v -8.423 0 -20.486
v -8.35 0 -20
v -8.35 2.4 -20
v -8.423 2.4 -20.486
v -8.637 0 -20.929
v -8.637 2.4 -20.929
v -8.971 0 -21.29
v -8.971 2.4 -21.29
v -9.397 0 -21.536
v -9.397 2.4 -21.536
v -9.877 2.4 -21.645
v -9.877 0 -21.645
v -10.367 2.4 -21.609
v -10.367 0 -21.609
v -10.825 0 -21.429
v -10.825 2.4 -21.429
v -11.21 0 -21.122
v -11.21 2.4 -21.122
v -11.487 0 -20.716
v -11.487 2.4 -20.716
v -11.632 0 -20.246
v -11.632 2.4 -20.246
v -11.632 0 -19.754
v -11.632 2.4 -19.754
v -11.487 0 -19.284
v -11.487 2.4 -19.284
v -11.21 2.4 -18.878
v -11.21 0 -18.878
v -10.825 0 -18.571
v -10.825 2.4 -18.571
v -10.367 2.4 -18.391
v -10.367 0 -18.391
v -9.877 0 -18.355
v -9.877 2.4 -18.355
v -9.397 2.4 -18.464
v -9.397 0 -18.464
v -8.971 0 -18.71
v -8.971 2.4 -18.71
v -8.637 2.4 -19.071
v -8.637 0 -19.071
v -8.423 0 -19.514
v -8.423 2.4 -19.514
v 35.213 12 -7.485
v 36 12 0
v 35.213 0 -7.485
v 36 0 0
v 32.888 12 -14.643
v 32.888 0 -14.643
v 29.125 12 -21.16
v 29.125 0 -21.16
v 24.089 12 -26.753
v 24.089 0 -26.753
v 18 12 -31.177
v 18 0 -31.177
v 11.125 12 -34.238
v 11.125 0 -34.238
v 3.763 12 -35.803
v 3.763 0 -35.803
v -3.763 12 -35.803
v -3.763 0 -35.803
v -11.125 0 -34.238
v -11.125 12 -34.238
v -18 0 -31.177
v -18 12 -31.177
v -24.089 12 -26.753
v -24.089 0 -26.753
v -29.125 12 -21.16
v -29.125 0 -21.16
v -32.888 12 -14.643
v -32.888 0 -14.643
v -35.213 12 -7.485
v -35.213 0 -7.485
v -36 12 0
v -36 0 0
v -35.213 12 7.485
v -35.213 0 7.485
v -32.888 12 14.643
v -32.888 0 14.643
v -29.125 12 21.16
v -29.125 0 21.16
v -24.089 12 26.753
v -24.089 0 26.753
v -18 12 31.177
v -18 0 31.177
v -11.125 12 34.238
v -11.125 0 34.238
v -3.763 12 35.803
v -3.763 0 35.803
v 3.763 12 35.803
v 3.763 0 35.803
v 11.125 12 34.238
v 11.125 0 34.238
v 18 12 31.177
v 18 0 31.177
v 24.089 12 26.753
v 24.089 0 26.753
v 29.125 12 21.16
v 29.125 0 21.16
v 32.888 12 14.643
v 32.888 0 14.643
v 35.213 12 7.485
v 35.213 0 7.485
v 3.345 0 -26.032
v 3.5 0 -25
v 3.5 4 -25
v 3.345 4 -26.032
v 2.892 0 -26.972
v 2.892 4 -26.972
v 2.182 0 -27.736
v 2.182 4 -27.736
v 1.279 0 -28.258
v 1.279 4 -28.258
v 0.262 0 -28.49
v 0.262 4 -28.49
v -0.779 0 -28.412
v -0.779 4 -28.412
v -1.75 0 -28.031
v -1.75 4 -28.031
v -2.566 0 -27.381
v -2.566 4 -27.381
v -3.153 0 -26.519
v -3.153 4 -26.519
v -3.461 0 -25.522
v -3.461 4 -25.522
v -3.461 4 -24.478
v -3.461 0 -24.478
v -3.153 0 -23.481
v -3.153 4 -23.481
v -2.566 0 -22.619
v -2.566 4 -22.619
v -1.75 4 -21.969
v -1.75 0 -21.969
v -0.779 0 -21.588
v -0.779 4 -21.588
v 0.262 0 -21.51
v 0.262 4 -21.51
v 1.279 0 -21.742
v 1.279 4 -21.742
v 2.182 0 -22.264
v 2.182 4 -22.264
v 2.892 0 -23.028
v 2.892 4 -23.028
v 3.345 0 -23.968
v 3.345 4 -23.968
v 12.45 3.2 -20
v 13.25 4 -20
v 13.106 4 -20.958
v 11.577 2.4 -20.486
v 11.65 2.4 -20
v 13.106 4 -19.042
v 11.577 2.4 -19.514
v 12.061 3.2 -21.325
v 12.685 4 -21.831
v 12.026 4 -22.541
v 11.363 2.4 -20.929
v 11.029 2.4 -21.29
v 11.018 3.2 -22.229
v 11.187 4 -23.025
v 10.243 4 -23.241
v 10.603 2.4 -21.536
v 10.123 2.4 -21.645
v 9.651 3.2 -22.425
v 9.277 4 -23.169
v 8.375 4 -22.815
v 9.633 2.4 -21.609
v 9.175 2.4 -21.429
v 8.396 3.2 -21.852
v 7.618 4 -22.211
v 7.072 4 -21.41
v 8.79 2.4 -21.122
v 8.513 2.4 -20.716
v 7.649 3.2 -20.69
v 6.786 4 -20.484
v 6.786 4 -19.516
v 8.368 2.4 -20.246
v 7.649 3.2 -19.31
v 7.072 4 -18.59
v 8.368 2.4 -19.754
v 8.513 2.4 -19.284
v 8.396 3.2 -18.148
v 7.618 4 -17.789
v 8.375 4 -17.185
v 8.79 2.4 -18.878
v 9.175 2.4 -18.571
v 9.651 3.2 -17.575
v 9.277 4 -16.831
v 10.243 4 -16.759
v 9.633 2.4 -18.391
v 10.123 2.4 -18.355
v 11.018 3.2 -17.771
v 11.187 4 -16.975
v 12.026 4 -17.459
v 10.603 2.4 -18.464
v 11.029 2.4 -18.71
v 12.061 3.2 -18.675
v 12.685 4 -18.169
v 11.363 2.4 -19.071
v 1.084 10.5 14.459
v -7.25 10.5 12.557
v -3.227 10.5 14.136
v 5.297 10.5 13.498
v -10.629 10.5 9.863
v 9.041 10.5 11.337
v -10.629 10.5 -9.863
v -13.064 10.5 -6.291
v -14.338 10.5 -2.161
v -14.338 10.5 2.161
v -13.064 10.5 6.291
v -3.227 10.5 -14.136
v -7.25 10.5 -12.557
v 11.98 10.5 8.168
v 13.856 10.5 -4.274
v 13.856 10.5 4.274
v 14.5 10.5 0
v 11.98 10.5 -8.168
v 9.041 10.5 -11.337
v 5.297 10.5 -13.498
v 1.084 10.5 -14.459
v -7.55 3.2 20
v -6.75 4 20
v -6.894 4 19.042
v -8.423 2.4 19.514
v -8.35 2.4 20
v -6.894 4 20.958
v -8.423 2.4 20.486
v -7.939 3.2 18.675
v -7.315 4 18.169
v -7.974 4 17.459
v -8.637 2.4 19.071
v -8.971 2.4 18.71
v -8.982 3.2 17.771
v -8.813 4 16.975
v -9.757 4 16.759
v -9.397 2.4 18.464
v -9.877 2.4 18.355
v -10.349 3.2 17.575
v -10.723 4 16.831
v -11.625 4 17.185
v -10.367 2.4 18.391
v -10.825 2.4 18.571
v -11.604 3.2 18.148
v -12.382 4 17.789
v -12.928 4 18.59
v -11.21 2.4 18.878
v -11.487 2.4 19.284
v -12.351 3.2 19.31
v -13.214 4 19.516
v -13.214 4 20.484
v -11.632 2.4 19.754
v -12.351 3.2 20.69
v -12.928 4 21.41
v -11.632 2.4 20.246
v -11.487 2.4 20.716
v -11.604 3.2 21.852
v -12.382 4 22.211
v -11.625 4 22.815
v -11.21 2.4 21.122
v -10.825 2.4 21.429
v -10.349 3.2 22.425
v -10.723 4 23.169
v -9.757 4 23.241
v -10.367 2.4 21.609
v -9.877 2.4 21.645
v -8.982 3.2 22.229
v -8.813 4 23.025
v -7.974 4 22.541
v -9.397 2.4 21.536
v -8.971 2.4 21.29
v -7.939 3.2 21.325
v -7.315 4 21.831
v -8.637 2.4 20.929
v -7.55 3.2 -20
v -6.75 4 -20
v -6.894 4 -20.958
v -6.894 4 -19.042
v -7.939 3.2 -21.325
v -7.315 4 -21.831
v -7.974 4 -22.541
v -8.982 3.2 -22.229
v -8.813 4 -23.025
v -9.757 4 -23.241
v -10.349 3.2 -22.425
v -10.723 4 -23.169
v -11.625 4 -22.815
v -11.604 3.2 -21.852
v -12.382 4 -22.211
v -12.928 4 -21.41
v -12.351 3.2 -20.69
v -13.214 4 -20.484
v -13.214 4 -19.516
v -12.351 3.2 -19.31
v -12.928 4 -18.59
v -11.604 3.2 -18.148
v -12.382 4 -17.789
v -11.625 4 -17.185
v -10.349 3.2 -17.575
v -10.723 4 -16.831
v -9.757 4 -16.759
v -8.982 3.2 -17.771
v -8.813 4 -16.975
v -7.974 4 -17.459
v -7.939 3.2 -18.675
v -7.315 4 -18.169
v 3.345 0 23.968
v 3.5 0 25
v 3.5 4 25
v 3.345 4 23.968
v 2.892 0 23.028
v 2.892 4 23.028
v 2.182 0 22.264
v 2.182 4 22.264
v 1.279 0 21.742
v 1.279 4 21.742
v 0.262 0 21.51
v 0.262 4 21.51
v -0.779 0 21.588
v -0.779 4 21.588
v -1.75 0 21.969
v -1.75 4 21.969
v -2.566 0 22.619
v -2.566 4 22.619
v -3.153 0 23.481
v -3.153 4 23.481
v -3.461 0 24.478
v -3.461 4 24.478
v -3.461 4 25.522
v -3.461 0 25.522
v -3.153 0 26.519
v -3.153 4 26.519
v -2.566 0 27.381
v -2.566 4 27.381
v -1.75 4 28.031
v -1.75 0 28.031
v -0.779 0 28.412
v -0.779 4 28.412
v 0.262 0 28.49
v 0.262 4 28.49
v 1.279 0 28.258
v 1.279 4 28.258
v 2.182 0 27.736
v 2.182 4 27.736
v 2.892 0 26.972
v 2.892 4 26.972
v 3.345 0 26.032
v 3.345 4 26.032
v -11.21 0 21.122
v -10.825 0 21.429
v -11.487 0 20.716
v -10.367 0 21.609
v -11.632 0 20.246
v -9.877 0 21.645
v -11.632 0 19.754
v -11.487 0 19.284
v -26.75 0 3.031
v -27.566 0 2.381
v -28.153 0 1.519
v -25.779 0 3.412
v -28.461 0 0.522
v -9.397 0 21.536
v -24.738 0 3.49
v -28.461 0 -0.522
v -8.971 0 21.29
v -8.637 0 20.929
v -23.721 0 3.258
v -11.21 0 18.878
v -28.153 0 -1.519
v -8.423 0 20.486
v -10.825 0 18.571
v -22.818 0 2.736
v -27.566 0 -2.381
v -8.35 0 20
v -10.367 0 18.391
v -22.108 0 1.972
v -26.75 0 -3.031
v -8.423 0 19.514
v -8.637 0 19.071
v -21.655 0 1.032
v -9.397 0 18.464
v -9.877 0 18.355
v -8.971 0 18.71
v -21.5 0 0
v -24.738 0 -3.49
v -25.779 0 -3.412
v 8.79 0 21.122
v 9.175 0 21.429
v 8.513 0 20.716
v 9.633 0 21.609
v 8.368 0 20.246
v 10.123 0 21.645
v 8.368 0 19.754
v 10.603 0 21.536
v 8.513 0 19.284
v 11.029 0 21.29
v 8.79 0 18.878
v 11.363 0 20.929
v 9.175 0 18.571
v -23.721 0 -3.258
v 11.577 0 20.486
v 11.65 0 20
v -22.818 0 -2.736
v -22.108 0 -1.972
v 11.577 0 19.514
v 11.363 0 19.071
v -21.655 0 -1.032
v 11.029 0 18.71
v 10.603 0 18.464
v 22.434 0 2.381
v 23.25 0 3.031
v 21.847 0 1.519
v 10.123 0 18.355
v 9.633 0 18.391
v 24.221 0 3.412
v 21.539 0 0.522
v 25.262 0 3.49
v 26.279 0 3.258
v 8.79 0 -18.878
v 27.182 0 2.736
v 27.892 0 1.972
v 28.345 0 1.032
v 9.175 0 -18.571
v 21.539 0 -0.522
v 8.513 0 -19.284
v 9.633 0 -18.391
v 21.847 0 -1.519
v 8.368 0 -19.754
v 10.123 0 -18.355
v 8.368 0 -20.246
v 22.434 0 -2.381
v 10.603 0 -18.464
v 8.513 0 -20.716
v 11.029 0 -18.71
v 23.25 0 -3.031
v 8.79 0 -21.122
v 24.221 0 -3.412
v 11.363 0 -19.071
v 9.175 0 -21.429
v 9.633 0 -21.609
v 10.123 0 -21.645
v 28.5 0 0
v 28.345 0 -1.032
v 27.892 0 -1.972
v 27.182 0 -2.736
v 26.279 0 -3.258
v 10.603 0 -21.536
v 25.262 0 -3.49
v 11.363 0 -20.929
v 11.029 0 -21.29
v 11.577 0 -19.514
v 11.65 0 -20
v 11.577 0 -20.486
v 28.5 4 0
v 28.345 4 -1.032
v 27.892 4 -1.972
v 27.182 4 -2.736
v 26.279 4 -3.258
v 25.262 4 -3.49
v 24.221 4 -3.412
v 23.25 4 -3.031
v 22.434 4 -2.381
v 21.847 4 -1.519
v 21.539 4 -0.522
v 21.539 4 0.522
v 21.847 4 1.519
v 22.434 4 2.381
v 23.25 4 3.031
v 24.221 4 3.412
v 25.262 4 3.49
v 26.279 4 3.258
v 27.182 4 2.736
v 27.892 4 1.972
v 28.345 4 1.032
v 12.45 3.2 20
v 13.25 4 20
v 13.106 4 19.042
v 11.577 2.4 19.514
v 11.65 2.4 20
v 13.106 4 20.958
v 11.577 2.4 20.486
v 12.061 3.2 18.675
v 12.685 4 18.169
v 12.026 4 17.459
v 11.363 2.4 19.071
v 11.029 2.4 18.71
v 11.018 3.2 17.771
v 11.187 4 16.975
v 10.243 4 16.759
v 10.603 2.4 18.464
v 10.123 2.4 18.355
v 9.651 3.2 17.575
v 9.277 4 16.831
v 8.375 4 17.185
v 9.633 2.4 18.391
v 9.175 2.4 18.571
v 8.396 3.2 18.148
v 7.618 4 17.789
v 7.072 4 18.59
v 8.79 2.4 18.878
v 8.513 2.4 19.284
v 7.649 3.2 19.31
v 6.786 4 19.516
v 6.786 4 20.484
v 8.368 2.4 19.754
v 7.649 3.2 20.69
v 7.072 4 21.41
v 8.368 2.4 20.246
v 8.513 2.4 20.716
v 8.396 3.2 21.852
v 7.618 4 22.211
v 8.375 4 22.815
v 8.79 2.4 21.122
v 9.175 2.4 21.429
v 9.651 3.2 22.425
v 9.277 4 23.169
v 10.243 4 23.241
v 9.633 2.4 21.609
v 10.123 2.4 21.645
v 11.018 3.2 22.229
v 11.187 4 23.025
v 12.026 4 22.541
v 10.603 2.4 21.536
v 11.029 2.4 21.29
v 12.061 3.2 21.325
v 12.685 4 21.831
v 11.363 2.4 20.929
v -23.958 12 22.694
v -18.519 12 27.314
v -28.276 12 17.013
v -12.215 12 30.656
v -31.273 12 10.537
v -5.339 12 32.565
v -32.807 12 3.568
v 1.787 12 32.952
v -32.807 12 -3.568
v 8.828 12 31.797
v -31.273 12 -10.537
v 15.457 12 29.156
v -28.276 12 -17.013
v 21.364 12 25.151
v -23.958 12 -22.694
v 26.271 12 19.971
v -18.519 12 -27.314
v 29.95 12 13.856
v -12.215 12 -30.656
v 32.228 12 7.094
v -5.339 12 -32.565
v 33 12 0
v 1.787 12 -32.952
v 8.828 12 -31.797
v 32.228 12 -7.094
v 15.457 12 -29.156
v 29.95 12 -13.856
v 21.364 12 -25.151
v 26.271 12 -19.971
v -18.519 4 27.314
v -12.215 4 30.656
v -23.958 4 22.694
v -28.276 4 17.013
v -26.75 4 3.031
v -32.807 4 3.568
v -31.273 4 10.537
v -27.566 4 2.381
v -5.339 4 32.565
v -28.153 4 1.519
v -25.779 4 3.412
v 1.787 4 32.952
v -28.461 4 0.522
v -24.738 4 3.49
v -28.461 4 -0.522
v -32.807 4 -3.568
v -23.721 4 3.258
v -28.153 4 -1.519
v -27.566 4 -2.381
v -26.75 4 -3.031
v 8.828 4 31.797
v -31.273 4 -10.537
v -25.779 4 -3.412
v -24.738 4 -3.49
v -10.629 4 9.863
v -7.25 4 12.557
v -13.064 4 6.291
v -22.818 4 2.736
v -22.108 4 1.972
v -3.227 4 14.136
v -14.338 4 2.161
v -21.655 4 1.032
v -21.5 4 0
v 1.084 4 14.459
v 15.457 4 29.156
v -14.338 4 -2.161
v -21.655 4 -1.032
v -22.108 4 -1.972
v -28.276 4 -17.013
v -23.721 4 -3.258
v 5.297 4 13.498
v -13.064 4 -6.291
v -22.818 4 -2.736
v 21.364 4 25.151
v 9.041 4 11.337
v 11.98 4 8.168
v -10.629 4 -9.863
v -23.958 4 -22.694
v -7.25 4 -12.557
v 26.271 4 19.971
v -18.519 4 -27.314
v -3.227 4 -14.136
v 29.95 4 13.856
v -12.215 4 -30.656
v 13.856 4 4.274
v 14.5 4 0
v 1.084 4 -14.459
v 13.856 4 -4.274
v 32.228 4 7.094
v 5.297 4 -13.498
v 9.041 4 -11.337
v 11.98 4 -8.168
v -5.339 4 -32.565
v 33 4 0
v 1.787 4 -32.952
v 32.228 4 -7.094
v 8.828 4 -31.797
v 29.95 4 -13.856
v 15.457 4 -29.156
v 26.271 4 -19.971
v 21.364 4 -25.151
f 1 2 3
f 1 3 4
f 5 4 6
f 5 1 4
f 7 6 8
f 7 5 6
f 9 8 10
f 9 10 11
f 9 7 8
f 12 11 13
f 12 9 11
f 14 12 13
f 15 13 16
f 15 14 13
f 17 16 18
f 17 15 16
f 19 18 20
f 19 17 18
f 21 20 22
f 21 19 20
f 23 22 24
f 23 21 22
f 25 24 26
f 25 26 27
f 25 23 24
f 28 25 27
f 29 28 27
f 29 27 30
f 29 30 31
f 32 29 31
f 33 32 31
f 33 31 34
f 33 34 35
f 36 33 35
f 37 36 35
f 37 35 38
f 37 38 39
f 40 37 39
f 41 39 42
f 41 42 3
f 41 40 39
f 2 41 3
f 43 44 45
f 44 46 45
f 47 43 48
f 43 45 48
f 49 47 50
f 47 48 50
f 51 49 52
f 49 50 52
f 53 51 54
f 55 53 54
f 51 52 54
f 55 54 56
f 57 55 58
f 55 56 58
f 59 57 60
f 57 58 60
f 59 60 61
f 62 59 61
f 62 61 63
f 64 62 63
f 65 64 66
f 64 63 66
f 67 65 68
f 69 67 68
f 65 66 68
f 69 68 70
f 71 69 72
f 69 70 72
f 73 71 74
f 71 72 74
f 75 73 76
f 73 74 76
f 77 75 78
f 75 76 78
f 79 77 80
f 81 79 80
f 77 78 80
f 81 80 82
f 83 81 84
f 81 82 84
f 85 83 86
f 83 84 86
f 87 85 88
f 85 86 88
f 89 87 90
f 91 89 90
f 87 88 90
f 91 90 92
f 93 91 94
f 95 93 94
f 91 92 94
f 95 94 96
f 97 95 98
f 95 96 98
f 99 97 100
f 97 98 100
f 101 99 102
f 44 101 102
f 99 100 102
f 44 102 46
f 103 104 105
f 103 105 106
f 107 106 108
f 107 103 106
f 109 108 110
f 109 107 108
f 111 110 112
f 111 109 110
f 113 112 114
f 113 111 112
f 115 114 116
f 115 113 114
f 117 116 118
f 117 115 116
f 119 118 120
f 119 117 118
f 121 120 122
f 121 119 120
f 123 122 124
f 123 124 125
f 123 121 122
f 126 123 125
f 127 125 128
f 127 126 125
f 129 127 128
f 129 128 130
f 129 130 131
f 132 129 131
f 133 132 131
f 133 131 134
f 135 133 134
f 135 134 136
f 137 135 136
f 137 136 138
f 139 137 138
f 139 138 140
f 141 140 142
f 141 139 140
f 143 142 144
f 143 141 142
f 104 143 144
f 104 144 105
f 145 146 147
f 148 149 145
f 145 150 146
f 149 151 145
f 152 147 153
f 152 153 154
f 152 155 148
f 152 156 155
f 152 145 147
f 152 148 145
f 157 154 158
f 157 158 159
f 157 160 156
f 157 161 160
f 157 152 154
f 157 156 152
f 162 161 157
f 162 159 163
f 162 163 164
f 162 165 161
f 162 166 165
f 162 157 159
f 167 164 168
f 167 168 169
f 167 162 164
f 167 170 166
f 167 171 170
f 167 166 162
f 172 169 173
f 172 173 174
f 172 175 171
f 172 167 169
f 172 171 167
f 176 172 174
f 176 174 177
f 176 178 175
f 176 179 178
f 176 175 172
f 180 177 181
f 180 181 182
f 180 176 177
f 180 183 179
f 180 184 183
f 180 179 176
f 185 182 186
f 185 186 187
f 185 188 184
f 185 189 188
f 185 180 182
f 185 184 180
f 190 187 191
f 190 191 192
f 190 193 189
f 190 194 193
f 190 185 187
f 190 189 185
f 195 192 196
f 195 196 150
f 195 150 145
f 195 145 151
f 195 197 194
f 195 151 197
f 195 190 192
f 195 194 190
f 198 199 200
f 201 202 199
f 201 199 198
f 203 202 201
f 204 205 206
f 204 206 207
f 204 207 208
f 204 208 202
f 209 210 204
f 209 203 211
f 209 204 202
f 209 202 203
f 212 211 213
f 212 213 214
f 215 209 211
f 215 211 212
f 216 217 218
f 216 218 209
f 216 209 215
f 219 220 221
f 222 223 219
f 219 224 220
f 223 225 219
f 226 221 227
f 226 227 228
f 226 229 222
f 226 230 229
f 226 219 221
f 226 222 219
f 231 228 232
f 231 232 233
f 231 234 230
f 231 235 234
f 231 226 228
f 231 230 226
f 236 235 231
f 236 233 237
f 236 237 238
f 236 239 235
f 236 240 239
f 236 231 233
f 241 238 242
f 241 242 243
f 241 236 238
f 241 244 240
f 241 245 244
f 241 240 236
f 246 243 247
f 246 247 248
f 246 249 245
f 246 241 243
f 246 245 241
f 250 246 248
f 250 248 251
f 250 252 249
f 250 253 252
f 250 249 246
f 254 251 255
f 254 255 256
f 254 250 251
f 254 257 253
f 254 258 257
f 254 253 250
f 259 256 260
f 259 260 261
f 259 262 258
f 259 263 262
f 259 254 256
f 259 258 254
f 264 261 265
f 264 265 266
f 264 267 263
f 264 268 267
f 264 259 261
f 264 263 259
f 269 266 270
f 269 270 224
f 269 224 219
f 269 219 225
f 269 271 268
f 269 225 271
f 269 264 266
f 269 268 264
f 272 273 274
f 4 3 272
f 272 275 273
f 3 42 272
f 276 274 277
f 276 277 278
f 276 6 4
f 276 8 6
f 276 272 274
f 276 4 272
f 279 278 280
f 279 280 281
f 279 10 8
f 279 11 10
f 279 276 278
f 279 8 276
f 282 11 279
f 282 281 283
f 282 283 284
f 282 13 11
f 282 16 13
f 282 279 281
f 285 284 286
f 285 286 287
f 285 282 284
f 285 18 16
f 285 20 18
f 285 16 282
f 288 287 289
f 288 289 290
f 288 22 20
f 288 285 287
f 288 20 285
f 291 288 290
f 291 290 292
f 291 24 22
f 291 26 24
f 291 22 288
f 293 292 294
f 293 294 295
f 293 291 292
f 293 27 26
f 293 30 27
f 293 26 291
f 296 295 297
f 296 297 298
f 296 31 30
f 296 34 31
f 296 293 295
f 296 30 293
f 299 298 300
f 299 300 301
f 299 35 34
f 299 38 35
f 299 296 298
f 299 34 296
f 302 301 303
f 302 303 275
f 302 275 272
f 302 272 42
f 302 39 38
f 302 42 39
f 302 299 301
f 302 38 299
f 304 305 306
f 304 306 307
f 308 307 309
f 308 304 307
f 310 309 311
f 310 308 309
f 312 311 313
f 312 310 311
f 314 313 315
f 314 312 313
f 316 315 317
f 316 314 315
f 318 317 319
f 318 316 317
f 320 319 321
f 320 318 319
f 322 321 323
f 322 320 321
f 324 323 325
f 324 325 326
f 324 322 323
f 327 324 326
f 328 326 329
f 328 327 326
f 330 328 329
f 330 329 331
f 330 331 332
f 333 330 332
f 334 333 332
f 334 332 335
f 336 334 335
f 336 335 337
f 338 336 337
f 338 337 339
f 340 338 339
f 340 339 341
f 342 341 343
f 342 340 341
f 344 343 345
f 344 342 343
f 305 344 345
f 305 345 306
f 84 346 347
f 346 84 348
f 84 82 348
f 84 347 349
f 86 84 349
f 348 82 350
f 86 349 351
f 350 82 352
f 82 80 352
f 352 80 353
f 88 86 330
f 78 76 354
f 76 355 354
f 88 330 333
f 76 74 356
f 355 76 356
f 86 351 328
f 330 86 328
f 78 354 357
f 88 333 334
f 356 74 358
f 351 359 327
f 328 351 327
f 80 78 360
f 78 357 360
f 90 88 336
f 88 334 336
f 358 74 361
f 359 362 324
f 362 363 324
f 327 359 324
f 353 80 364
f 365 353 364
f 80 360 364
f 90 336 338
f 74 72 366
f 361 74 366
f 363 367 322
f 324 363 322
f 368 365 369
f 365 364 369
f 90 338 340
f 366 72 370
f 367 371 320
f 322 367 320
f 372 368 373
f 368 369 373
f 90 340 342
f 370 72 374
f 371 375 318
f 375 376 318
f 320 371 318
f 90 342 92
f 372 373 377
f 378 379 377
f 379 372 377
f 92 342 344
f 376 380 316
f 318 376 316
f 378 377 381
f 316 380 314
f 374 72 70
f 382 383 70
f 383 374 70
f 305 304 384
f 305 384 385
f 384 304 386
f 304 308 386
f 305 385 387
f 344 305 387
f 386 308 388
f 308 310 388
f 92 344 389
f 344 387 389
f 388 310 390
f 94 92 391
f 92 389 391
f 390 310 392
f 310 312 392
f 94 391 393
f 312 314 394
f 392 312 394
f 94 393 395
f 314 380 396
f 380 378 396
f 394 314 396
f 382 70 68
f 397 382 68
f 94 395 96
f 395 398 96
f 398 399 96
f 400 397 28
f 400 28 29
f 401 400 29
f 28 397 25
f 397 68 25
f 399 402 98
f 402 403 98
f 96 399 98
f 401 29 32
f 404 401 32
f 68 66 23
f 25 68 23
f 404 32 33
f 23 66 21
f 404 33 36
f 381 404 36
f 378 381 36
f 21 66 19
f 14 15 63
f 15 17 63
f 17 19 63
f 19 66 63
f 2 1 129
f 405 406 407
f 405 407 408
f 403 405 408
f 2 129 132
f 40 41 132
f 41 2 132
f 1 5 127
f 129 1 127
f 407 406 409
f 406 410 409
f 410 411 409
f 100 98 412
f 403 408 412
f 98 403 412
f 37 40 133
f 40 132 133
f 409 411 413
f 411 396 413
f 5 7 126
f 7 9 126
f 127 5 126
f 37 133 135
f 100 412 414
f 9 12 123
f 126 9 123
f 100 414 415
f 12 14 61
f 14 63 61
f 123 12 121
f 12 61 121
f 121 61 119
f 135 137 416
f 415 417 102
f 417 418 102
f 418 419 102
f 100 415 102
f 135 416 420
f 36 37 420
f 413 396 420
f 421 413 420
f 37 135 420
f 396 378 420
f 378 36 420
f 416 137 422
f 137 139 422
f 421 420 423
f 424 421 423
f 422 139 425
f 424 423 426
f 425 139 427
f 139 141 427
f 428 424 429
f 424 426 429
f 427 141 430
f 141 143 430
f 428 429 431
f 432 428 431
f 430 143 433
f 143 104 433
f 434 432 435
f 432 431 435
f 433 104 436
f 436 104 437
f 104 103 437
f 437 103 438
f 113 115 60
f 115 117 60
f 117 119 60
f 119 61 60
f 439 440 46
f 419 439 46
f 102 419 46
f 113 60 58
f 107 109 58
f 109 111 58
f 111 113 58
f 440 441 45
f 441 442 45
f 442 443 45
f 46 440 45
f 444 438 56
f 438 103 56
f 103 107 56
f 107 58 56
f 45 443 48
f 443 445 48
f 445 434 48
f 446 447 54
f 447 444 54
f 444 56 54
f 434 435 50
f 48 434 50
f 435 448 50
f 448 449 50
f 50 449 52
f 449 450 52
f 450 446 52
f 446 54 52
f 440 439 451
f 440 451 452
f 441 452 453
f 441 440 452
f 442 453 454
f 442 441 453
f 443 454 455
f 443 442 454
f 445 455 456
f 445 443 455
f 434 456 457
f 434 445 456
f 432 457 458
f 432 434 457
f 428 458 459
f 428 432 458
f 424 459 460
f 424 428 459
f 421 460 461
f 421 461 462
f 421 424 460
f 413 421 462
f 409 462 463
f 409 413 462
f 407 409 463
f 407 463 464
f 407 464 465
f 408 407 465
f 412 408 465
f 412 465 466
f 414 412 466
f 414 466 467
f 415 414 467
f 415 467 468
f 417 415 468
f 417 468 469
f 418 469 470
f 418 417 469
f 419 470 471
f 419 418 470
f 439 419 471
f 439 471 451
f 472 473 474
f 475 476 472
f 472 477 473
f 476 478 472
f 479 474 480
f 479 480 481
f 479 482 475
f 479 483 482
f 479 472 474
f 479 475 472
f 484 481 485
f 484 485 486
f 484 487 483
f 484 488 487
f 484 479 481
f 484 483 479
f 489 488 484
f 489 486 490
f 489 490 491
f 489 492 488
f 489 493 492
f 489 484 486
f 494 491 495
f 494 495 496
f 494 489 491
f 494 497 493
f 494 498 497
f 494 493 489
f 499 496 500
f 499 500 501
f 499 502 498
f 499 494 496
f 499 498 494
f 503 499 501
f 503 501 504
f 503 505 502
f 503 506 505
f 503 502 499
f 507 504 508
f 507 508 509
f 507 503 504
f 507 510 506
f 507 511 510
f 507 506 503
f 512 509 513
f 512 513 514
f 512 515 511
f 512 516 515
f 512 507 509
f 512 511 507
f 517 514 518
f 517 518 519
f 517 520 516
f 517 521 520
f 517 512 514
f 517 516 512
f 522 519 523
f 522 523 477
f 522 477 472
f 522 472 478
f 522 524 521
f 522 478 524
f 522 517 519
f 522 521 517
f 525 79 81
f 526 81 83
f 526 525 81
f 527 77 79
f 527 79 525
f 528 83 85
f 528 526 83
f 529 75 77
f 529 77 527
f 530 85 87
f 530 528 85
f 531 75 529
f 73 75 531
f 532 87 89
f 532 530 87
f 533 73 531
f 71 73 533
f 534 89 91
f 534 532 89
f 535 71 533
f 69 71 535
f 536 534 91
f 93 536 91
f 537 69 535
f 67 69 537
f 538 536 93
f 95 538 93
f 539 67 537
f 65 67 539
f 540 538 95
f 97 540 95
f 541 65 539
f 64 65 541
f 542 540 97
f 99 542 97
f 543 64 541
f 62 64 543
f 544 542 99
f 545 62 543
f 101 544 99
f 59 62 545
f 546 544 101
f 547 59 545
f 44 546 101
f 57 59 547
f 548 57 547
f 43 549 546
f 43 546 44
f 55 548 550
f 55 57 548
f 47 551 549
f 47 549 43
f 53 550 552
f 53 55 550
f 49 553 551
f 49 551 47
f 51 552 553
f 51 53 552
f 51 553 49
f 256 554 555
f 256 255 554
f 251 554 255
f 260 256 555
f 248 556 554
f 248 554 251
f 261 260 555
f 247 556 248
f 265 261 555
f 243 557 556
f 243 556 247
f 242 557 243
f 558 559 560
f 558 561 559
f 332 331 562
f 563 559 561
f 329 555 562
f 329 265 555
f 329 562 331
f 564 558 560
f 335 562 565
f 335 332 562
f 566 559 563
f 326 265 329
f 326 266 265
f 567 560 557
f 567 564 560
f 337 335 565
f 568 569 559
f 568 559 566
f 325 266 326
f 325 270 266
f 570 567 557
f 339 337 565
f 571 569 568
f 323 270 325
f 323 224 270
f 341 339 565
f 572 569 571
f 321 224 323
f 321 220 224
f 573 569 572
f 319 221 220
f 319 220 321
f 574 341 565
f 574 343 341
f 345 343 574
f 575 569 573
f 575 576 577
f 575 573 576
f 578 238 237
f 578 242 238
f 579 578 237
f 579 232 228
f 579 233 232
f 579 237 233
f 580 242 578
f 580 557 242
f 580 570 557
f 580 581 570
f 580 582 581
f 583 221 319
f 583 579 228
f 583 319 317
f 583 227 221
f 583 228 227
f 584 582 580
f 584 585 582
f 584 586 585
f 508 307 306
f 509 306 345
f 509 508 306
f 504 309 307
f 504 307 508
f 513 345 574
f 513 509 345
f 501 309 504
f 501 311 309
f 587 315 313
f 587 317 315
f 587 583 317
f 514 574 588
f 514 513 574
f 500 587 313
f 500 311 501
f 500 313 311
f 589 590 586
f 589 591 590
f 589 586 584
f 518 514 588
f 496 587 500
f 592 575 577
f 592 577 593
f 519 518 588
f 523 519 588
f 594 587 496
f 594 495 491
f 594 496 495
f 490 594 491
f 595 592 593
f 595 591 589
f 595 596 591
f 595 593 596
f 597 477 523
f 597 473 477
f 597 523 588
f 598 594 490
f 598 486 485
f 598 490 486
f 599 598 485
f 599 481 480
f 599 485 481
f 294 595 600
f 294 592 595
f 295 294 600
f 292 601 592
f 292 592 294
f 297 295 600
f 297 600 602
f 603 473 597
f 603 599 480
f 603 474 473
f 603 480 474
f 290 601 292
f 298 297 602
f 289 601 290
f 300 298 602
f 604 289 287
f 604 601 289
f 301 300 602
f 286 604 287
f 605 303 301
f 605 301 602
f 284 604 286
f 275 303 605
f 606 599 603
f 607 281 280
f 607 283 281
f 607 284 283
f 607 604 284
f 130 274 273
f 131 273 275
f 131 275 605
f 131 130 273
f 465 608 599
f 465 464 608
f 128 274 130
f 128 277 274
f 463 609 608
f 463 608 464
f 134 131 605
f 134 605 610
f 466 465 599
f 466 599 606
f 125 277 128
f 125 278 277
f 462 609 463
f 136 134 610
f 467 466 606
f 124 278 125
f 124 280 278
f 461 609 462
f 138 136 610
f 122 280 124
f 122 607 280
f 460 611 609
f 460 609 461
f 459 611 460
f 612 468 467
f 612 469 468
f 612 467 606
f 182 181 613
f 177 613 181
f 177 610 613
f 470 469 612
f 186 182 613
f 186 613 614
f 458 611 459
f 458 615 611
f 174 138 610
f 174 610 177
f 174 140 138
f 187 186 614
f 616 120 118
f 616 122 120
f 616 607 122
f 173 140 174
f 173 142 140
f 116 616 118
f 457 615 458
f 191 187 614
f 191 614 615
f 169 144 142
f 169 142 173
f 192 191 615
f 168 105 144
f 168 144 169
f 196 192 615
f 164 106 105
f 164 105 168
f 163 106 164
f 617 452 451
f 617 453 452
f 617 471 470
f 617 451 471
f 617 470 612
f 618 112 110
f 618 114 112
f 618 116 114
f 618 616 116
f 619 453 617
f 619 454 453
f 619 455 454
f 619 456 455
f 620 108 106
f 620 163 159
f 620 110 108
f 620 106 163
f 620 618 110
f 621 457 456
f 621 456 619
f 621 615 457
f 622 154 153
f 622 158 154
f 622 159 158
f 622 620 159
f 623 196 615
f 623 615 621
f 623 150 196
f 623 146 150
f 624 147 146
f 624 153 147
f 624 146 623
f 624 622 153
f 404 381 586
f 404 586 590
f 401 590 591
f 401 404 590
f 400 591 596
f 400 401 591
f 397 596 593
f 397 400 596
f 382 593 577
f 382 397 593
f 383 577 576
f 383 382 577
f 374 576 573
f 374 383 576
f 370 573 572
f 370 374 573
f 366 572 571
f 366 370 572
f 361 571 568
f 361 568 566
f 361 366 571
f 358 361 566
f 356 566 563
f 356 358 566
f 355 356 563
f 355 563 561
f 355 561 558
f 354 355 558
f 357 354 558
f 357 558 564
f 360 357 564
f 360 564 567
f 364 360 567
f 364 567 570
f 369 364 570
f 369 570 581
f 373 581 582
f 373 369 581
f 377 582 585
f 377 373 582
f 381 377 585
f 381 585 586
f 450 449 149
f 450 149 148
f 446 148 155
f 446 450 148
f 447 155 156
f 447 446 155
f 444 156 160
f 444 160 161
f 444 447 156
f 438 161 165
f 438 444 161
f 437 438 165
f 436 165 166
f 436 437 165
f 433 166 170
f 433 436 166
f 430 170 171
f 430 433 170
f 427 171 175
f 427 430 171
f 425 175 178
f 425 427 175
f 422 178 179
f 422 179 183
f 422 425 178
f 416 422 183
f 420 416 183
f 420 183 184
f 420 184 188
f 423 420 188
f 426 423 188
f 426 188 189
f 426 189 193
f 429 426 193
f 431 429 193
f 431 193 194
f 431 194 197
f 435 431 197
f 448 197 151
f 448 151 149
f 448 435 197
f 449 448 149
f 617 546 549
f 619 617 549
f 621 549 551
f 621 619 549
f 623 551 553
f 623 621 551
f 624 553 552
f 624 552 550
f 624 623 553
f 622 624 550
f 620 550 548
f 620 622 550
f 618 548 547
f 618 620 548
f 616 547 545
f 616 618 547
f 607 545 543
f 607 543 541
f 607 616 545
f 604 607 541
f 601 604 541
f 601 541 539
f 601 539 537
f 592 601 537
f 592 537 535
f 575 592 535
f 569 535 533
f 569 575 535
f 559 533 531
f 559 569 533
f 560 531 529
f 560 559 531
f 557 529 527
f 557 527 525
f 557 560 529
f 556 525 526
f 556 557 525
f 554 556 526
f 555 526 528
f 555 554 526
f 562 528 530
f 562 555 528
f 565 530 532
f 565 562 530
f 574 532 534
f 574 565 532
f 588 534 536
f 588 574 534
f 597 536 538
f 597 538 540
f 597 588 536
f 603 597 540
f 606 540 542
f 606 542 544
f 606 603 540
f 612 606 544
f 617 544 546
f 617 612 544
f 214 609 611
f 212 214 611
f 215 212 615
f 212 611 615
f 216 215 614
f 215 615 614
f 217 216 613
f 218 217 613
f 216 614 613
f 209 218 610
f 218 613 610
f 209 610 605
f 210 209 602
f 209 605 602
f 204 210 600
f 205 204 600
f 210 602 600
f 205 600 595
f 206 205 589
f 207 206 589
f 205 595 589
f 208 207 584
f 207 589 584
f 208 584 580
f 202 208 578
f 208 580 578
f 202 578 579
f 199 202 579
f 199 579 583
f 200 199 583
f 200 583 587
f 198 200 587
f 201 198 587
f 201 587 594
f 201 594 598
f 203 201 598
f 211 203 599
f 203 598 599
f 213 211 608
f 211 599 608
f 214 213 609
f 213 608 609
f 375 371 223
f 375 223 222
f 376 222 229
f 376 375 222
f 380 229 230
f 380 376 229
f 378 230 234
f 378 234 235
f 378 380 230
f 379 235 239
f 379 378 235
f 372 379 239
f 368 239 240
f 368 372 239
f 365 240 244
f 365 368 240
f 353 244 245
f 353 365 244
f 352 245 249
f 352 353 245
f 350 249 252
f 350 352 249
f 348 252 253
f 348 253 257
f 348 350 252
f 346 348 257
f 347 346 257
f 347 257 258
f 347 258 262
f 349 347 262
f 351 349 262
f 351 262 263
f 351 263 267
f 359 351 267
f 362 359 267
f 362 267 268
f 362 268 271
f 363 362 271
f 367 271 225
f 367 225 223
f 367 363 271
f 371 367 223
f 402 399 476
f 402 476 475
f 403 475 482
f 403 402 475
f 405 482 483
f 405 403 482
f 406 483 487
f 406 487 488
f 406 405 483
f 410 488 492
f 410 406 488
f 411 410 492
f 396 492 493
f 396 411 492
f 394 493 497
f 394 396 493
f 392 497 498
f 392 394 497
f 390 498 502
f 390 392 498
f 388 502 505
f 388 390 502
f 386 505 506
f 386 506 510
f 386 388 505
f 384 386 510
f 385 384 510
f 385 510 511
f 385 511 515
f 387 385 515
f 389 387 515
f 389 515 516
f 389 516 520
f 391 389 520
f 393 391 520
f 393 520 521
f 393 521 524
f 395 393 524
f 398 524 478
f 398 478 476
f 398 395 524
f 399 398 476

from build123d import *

# Parameters (mm, degrees)
SKETCH1_R           = 36
SKETCH1_R_2         = 3.5
SKETCH1_R_3         = 1.65
BOSS_EXTRUDE1_DEPTH = 4
SKETCH2_R           = 14.5
BOSS_EXTRUDE2_DEPTH = 6.5
SKETCH3_R           = 36
SKETCH3_R_2         = 33
BOSS_EXTRUDE3_DEPTH = 8
CHAMFER1_SIZE       = 1.6


with BuildPart() as part:
    # Sketch1 → Boss-Extrude1 (new body)
    with BuildSketch(Plane(origin=(0, 0, 0), x_dir=(1, 0, 0), z_dir=(0, 1, 0))):
        Circle(SKETCH1_R)
        with Locations((25, 0)):
            Circle(SKETCH1_R_2, mode=Mode.SUBTRACT)
        with Locations((0, -25)):
            Circle(SKETCH1_R_2, mode=Mode.SUBTRACT)
        with Locations((-10, 20)):
            Circle(SKETCH1_R_3, mode=Mode.SUBTRACT)
        with Locations((10, 20)):
            Circle(SKETCH1_R_3, mode=Mode.SUBTRACT)
        with Locations((10, -20)):
            Circle(SKETCH1_R_3, mode=Mode.SUBTRACT)
        with Locations((-10, -20)):
            Circle(SKETCH1_R_3, mode=Mode.SUBTRACT)
        with Locations((0, 25)):
            Circle(SKETCH1_R_2, mode=Mode.SUBTRACT)
        with Locations((-25, 0)):
            Circle(SKETCH1_R_2, mode=Mode.SUBTRACT)
    extrude(amount=BOSS_EXTRUDE1_DEPTH)

    # Sketch2 → Boss-Extrude2 (add)
    with BuildSketch(Plane(origin=(0, 4, 0), x_dir=(1, 0, 0), z_dir=(0, 1, 0))):
        Circle(SKETCH2_R)
    extrude(amount=BOSS_EXTRUDE2_DEPTH)

    # Sketch3 → Boss-Extrude3 (add)
    with BuildSketch(Plane(origin=(0, 4, 0), x_dir=(1, 0, 0), z_dir=(0, 1, 0))):
        Circle(SKETCH3_R)
        Circle(SKETCH3_R_2, mode=Mode.SUBTRACT)
    extrude(amount=BOSS_EXTRUDE3_DEPTH)

    # Chamfer1
    chamfer1_edges = [part.edges().sort_by_distance(p)[0] for p in [
        (8.35, 4, -20),
        (8.35, 4, 20),
        (-11.65, 4, 20),
        (-11.65, 4, -20),
    ]]
    chamfer(chamfer1_edges, length=CHAMFER1_SIZE)


solid = part.part
